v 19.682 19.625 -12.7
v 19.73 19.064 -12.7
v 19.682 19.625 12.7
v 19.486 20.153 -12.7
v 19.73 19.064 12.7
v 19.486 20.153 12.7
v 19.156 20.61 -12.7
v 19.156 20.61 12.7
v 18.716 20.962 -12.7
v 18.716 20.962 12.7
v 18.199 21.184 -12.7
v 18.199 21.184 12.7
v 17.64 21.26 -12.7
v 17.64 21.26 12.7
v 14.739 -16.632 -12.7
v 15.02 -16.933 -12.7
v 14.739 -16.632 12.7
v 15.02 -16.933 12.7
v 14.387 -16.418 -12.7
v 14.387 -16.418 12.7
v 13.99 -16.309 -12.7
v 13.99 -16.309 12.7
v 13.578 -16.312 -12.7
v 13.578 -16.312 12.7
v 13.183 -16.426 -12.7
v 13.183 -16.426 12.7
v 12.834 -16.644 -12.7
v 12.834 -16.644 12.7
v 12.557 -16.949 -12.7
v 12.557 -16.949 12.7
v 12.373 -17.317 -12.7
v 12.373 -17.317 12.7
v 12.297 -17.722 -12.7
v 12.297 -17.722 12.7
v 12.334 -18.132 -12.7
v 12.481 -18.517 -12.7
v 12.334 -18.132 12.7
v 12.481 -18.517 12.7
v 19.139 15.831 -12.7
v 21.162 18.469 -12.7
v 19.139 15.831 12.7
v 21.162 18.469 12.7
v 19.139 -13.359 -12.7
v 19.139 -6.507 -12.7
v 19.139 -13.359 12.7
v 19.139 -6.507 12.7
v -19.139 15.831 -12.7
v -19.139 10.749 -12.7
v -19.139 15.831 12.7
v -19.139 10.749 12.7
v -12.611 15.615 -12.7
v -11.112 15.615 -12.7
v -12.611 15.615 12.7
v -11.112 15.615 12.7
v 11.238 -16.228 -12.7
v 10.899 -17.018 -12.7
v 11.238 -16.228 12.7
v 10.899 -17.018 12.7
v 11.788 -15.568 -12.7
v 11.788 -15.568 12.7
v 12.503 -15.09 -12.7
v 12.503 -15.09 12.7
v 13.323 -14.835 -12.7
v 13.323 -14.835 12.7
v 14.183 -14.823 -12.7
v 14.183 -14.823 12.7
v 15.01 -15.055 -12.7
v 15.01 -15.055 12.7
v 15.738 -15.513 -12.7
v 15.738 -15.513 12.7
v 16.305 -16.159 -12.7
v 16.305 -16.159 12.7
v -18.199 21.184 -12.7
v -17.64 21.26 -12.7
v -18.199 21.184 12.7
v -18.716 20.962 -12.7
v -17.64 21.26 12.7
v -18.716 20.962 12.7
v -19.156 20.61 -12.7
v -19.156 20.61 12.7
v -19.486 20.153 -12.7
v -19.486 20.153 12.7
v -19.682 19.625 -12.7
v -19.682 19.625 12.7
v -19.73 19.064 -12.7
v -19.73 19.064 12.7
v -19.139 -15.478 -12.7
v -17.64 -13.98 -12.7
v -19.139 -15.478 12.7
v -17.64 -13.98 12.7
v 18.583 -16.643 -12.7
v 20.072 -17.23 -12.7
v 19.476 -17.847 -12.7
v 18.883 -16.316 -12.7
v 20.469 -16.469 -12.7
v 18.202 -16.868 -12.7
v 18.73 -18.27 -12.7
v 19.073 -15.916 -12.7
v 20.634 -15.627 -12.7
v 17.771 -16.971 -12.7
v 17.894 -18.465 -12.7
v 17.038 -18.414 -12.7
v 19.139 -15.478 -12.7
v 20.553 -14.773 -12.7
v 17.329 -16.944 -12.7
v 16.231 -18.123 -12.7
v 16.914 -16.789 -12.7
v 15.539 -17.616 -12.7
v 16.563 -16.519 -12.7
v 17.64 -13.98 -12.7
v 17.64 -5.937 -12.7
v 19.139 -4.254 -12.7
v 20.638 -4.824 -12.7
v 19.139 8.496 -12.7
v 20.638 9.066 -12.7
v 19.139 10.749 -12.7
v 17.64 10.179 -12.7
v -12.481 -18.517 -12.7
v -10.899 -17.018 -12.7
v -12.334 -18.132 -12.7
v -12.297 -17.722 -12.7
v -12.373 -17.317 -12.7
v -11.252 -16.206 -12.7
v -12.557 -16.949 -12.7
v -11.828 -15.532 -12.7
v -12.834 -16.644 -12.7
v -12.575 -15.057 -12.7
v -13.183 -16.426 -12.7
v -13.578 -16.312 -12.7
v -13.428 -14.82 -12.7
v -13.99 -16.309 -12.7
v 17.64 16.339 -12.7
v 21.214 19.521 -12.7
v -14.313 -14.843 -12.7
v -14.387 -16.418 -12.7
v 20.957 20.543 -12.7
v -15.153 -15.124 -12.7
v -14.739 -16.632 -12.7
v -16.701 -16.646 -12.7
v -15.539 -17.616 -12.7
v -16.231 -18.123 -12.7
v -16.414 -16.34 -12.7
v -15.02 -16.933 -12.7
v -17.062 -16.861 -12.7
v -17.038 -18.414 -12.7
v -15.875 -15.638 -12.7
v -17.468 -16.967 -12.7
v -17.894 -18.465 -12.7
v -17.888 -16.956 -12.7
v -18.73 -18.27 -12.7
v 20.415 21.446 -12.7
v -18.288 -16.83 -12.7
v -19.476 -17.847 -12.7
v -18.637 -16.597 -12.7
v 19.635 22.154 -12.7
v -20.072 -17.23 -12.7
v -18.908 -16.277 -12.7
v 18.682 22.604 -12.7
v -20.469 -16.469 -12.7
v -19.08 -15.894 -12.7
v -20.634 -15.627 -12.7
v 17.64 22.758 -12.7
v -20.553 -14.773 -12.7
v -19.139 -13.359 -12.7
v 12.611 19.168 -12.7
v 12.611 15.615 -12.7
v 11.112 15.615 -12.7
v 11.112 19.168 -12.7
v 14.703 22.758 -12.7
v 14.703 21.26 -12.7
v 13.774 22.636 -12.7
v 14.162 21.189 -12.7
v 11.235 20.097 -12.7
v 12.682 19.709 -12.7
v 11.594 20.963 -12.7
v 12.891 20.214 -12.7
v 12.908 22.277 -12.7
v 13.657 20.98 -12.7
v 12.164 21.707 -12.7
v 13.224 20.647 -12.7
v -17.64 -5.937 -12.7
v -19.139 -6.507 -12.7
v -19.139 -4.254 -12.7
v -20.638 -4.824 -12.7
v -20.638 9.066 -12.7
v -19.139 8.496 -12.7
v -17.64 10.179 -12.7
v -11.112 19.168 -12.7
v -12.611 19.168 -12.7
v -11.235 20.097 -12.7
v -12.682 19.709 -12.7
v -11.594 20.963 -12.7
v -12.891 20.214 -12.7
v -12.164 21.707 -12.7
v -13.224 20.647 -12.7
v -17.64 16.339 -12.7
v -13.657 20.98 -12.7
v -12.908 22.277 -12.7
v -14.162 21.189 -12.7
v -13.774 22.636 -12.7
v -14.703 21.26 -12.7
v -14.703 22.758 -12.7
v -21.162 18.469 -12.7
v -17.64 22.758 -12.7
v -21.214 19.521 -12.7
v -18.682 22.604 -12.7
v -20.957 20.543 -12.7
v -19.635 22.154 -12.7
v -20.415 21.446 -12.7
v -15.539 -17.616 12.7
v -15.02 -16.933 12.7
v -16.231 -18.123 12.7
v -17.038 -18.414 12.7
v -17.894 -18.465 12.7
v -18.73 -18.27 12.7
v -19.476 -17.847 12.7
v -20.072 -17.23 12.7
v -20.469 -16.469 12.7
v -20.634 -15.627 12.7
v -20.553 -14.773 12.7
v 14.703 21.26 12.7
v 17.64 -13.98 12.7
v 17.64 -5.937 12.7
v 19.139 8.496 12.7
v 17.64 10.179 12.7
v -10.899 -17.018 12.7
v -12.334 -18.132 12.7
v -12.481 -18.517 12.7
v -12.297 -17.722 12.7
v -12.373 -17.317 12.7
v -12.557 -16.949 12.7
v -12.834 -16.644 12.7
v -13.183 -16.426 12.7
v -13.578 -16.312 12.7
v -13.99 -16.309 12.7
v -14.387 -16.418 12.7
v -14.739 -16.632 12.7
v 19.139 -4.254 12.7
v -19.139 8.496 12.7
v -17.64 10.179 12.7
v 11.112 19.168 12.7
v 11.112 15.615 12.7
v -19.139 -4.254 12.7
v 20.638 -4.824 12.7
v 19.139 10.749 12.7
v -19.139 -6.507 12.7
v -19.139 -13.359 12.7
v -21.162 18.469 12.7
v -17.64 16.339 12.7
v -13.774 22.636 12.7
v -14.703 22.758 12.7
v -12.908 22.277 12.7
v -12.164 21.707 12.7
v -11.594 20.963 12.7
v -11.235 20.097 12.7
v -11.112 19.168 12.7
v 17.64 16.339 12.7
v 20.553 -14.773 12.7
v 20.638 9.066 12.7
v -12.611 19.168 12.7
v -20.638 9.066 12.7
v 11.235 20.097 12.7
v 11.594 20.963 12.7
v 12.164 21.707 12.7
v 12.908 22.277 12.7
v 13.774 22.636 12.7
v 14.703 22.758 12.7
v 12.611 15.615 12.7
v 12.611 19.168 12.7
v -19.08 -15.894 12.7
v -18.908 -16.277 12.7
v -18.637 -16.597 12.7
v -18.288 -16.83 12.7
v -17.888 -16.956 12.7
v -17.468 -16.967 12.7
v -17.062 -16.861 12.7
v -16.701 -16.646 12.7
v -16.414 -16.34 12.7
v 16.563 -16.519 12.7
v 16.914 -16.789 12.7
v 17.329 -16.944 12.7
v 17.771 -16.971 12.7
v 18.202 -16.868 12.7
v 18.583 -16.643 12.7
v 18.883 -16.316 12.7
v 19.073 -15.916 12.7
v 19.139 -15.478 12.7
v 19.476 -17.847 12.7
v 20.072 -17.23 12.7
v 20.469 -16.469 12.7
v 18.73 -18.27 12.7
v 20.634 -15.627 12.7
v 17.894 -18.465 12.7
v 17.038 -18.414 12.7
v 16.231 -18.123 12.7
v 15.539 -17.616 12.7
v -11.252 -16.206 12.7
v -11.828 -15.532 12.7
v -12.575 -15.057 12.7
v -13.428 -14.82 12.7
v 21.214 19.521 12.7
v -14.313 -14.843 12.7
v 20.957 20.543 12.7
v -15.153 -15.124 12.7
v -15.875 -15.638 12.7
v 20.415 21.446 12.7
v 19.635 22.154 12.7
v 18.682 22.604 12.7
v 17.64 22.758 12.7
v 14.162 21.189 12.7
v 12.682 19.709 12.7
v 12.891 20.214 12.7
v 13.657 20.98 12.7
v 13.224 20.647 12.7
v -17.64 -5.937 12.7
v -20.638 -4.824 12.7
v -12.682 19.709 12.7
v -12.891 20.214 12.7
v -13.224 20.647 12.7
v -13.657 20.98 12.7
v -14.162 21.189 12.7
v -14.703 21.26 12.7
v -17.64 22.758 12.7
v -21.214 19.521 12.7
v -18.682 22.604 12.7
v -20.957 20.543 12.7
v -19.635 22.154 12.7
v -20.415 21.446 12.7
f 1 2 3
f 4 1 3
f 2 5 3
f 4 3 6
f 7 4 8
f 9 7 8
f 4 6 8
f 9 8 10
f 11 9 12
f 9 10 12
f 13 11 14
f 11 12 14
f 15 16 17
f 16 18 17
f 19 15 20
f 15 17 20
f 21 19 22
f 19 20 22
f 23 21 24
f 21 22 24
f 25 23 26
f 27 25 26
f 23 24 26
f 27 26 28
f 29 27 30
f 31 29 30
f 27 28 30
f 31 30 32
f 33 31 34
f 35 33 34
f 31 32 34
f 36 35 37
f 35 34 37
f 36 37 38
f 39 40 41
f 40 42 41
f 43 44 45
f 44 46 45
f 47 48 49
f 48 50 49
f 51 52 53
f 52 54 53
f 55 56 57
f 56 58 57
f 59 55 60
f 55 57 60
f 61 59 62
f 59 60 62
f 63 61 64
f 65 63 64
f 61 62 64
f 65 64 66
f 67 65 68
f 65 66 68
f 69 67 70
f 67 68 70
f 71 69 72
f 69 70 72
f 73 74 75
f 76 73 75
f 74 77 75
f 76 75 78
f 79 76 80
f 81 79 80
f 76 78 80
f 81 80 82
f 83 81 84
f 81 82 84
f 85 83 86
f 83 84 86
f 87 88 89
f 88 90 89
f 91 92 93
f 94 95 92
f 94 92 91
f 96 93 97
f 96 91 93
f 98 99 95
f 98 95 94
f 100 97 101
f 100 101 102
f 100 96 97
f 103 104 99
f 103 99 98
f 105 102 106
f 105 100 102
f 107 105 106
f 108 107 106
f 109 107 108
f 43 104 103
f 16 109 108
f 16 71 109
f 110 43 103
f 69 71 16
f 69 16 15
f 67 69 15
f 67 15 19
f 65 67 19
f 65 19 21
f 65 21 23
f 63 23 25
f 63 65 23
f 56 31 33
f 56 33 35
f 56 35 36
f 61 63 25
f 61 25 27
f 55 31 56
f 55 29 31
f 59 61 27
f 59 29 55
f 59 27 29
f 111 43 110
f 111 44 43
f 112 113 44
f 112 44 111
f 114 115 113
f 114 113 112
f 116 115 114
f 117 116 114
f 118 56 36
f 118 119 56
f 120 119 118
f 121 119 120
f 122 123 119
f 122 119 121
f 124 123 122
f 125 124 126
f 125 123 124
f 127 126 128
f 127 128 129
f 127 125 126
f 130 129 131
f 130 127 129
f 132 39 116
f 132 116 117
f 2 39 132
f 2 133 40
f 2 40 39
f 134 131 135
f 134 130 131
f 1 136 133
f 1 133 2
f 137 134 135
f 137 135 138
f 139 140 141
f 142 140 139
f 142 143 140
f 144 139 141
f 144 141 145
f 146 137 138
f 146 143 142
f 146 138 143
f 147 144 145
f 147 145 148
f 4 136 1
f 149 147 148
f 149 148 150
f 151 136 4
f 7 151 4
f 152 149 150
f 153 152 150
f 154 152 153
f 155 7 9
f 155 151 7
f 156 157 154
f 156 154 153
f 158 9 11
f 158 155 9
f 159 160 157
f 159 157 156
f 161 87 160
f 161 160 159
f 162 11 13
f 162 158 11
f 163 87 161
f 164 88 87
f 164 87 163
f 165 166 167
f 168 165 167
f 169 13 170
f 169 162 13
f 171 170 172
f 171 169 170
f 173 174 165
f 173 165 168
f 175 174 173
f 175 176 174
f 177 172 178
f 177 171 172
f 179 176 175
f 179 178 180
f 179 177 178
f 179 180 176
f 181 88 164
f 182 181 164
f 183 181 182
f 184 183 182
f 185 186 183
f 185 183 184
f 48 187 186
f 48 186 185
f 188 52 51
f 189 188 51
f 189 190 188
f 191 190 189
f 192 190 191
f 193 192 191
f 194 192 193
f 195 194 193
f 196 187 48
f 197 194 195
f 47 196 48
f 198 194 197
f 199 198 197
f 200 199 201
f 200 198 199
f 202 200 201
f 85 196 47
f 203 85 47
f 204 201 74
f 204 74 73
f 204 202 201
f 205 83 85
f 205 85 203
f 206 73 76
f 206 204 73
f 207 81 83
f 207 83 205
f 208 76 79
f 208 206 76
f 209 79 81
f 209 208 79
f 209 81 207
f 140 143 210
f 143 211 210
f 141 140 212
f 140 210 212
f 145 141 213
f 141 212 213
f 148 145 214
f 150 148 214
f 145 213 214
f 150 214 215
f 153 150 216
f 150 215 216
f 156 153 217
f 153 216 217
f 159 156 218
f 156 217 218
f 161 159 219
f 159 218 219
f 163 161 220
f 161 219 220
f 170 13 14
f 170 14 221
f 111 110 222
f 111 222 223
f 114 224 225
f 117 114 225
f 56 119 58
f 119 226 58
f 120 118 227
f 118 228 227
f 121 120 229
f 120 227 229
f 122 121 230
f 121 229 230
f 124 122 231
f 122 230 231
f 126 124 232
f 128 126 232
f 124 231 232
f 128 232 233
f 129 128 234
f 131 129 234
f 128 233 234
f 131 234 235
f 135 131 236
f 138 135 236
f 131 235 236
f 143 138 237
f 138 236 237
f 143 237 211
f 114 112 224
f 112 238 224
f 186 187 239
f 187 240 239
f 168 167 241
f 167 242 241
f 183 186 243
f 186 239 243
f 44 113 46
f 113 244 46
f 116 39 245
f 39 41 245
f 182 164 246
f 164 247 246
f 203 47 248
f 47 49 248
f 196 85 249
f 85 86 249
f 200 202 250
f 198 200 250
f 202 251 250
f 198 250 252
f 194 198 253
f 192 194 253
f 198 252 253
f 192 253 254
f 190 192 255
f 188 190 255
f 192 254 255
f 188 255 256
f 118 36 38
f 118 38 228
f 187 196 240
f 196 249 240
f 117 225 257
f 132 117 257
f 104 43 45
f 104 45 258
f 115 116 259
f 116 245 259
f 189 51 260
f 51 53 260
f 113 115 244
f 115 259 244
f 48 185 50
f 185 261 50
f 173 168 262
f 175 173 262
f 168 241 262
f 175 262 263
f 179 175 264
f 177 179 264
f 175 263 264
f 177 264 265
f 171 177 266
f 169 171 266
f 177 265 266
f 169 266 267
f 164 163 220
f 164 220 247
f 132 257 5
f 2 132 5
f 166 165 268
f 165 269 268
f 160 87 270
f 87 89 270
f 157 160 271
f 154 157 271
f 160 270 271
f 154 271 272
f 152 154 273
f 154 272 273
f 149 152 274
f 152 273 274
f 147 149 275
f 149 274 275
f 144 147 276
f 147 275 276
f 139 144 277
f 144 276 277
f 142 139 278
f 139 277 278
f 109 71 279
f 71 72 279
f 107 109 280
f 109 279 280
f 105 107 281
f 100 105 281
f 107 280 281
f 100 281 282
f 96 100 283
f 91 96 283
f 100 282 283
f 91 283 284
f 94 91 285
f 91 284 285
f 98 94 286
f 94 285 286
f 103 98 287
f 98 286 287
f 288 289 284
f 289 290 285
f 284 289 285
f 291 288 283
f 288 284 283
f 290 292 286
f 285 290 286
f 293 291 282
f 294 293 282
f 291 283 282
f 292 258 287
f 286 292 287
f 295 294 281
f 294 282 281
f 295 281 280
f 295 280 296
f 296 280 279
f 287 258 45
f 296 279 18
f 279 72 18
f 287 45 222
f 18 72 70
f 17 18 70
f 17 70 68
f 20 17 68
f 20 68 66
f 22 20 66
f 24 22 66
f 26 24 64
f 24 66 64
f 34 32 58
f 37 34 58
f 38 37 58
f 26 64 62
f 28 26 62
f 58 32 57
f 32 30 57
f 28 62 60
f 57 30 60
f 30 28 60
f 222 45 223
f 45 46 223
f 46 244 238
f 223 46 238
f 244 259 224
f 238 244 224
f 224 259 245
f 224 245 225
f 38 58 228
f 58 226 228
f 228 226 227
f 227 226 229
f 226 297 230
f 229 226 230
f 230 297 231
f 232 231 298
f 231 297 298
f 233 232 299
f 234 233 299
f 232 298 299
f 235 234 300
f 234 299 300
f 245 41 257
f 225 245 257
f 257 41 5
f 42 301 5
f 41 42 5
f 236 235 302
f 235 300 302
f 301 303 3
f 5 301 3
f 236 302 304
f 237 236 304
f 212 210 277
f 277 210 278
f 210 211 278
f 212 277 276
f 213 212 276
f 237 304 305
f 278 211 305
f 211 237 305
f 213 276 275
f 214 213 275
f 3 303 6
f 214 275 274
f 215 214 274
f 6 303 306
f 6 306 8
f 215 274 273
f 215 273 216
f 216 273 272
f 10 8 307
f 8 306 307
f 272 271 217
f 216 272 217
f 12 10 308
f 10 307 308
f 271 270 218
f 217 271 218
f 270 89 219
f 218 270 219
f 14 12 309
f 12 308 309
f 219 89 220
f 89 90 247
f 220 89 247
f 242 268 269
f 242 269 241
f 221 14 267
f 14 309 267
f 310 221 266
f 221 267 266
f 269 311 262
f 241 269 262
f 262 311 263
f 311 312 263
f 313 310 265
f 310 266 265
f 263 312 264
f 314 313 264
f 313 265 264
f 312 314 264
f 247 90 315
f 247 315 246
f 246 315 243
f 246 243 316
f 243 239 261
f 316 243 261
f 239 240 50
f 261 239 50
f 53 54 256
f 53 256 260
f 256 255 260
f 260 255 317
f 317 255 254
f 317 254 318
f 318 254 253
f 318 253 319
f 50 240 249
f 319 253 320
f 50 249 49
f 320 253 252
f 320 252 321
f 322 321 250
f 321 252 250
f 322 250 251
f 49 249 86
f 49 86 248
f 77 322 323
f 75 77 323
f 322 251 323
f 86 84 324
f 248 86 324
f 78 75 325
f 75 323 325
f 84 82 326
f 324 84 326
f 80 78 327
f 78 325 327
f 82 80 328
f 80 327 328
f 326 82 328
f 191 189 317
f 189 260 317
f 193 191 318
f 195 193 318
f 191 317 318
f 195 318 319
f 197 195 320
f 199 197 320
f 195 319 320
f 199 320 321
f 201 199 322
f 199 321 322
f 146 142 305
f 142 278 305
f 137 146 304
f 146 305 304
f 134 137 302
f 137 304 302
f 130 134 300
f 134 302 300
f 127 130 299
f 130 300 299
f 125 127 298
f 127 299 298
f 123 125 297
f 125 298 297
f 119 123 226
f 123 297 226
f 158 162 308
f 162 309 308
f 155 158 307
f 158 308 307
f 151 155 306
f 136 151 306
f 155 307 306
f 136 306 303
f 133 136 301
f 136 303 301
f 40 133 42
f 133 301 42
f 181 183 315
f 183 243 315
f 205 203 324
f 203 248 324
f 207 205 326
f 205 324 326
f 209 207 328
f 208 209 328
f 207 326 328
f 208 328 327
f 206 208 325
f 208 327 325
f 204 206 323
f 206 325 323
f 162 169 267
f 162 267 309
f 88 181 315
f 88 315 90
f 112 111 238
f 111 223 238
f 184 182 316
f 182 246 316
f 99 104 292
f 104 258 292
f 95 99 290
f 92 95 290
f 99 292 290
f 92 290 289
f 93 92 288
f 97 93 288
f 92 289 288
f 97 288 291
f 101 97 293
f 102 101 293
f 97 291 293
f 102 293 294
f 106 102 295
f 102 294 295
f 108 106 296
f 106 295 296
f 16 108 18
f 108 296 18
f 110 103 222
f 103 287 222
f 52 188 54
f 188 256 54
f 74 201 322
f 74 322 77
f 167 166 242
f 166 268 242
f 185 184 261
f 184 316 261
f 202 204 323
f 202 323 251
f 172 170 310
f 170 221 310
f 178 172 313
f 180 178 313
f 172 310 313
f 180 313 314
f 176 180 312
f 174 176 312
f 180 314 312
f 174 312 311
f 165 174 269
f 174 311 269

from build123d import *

# Parameters (mm, degrees)
BASE_EXTRUDE_DEPTH = 12.7


with BuildPart() as part:
    # Sketch1 → Base-Extrude (new, symmetric)
    with BuildSketch(Plane.XY):
        with BuildLine():
            Line((17.6403, 16.339286512), (19.729882578, 19.063533504))
            ThreePointArc((19.729882578, 19.063533504), (19.156045845, 20.609744632), (17.6403, 21.2598))
            Line((17.6403, 21.2598), (14.70327367, 21.2598))
            ThreePointArc((14.70327367, 21.2598), (13.223883481, 20.647016519), (12.6111, 19.16762633))
            Line((12.6111, 19.16762633), (12.6111, 15.61465))
            Line((12.6111, 15.61465), (11.1125, 15.61465))
            Line((11.1125, 15.61465), (11.1125, 19.16762633))
            ThreePointArc((11.1125, 19.16762633), (12.164213258, 21.706686742), (14.70327367, 22.7584))
            Line((14.70327367, 22.7584), (17.6403, 22.7584))
            ThreePointArc((17.6403, 22.7584), (20.415434554, 21.446284653), (21.162428673, 18.4688666))
            Line((21.162428673, 18.4688666), (19.1389, 15.830735923))
            Line((19.1389, 15.830735923), (19.1389, 10.749129415))
            Line((19.1389, 10.749129415), (20.6375, 9.0662125))
            Line((20.6375, 9.0662125), (20.6375, -4.8244125))
            Line((20.6375, -4.8244125), (19.1389, -6.507329415))
            Line((19.1389, -6.507329415), (19.1389, -13.358784555))
            Line((19.1389, -13.358784555), (20.553458003, -14.773342558))
            ThreePointArc((20.553458003, -14.773342558), (18.729942105, -18.270236732), (15.019825564, -16.932883251))
            ThreePointArc((15.019825564, -16.932883251), (13.000752562, -16.523120627), (12.480559153, -18.5166))
            Line((12.480559153, -18.5166), (-12.480559153, -18.5166))
            ThreePointArc((-12.480559153, -18.5166), (-13.000752562, -16.523120627), (-15.019825564, -16.932883251))
            ThreePointArc((-15.019825564, -16.932883251), (-18.729942105, -18.270236732), (-20.553458003, -14.773342558))
            Line((-20.553458003, -14.773342558), (-19.1389, -13.358784555))
            Line((-19.1389, -13.358784555), (-19.1389, -6.507329415))
            Line((-19.1389, -6.507329415), (-20.6375, -4.8244125))
            Line((-20.6375, -4.8244125), (-20.6375, 9.0662125))
            Line((-20.6375, 9.0662125), (-19.1389, 10.749129415))
            Line((-19.1389, 10.749129415), (-19.1389, 15.830735923))
            Line((-19.1389, 15.830735923), (-21.162428673, 18.4688666))
            ThreePointArc((-21.162428673, 18.4688666), (-20.415434554, 21.446284653), (-17.6403, 22.7584))
            Line((-17.6403, 22.7584), (-14.70327367, 22.7584))
            ThreePointArc((-14.70327367, 22.7584), (-12.164213258, 21.706686742), (-11.1125, 19.16762633))
            Line((-11.1125, 19.16762633), (-11.1125, 15.61465))
            Line((-11.1125, 15.61465), (-12.6111, 15.61465))
            Line((-12.6111, 15.61465), (-12.6111, 19.16762633))
            ThreePointArc((-12.6111, 19.16762633), (-13.223883481, 20.647016519), (-14.70327367, 21.2598))
            Line((-14.70327367, 21.2598), (-17.6403, 21.2598))
            ThreePointArc((-17.6403, 21.2598), (-19.156045845, 20.609744632), (-19.729882578, 19.063533504))
            Line((-19.729882578, 19.063533504), (-17.6403, 16.339286512))
            Line((-17.6403, 16.339286512), (-17.6403, 10.17860201))
            Line((-17.6403, 10.17860201), (-19.1389, 8.495685095))
            Line((-19.1389, 8.495685095), (-19.1389, -4.253885095))
            Line((-19.1389, -4.253885095), (-17.6403, -5.93680201))
            Line((-17.6403, -5.93680201), (-17.6403, -13.979525))
            Line((-17.6403, -13.979525), (-19.1389, -15.478125))
            ThreePointArc((-19.1389, -15.478125), (-18.092238669, -16.906954381), (-16.414285827, -16.33992034))
            ThreePointArc((-16.414285827, -16.33992034), (-13.428073412, -14.819877156), (-10.898992189, -17.018))
            Line((-10.898992189, -17.018), (10.898992189, -17.018))
            ThreePointArc((10.898992189, -17.018), (13.323359075, -14.834630878), (16.30518861, -16.15877141))
            ThreePointArc((16.30518861, -16.15877141), (17.990302879, -16.935279743), (19.1389, -15.478125))
            Line((19.1389, -15.478125), (17.6403, -13.979525))
            Line((17.6403, -13.979525), (17.6403, -5.93680201))
            Line((17.6403, -5.93680201), (19.1389, -4.253885095))
            Line((19.1389, -4.253885095), (19.1389, 8.495685095))
            Line((19.1389, 8.495685095), (17.6403, 10.17860201))
            Line((17.6403, 10.17860201), (17.6403, 16.339286512))
        make_face()
    extrude(amount=BASE_EXTRUDE_DEPTH, both=True)


solid = part.part
